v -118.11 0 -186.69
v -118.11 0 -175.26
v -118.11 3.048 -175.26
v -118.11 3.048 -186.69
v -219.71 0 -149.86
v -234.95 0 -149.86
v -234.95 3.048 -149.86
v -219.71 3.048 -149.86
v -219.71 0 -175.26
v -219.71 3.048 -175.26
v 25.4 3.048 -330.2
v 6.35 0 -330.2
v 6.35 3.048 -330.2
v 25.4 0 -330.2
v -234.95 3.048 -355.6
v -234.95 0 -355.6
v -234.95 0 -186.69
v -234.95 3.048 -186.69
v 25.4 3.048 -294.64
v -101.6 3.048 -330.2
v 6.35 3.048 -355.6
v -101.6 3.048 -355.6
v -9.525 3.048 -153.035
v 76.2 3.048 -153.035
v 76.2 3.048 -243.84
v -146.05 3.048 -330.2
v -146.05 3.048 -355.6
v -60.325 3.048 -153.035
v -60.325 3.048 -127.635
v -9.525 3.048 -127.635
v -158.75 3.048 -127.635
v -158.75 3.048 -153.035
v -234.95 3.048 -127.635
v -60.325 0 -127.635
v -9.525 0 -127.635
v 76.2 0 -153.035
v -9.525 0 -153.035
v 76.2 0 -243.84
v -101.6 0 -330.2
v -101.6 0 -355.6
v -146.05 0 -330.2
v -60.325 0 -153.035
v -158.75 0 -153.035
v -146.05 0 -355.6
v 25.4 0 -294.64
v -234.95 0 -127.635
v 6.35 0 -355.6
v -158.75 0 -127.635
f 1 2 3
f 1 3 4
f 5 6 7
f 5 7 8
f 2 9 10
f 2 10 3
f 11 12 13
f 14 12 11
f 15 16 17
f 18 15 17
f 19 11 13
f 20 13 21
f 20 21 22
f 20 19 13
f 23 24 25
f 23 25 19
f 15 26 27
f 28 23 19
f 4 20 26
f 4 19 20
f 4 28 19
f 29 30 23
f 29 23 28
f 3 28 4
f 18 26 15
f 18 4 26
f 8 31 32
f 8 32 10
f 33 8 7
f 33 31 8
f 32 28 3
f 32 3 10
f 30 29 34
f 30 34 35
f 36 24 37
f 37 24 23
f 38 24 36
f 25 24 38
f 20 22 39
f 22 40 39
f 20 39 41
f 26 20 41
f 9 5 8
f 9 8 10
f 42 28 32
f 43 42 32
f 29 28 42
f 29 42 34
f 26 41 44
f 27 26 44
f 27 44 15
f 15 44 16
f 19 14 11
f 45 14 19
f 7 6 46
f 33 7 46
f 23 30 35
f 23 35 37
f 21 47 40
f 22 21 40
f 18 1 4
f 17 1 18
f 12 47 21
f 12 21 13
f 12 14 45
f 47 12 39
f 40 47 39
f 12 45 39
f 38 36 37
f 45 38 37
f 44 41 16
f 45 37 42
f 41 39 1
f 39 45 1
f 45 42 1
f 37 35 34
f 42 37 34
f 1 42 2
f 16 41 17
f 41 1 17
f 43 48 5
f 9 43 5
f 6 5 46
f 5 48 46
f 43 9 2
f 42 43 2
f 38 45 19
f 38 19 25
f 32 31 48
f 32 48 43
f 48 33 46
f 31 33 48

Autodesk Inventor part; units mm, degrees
ref_plane "YZ Plane" through (0, 0, 0) normal (1, 0, 0) x (0, 1, 0)
ref_plane "XZ Plane" through (0, 0, 0) normal (0, 1, 0) x (-1, 0, 0)
ref_plane "XY Plane" through (0, 0, 0) normal (0, 0, 1) x (1, 0, 0)
sketch "Sketch1" plane through (0, 0, 0) normal (0, 1, 0) x (-1, 0, 0)
  line L0 (234.95, 355.6) -> (-234.95, 355.6)
  line L1 (-234.95, 355.6) -> (-234.95, -355.6)
  line L2 (-234.95, -355.6) -> (234.95, -355.6)
  line L3 (234.95, -355.6) -> (234.95, 355.6)
  line L4 (234.95, 355.6) -> (-234.95, -355.6) construction
  line L5 (-234.95, 355.6) -> (234.95, -355.6) construction
  point P0 (0, 0)
  dimension "d0" = 469.9
  dimension "d1" = 711.2
extrude "Plate1" add sketch "Sketch1" along normal blind 3.048
sketch "Sketch3" plane through (0, 3.048, 0) normal (0, 1, 0) x (1, 0, 0)
  line L0 (234.95, -355.6) -> (-234.95, -355.6) projected
  point P0 (0, 0)
sketch "Sketch4" plane through (0, 0, 0) normal (0, -1, 0) x (1, 0, 0)
  line L0 (-234.95, 355.6) -> (234.95, 355.6) projected
  line L1 (-234.95, -355.6) -> (-234.95, 355.6) projected
  line L2 (234.95, -355.6) -> (-234.95, -355.6) projected
  line L3 (234.95, 355.6) -> (234.95, -355.6) projected
  line L4 (-234.95, 355.6) -> (234.95, 355.6) projected
  line L5 (25.4, 355.6) -> (25.4, 294.64)
  line L6 (165.1, 101.6) -> (234.95, 101.6)
  line L7 (234.95, 355.6) -> (234.95, -355.6) projected
  line L8 (25.4, 294.64) -> (165.1, 154.94)
  line L9 (25.4, 294.64) -> (222.9656, 294.64) construction
  line L10 (165.1, 154.94) -> (165.1, 101.6)
  line L11 (234.95, 0) -> (-234.95, 0)
  line L12 (-234.95, -355.6) -> (-234.95, 355.6) projected
  line L13 (25.4, -355.6) -> (25.4, -294.64)
  line L14 (165.1, -127) -> (234.95, -127)
  line L15 (25.4, -294.64) -> (165.1, -154.94)
  line L16 (25.4, -294.64) -> (222.9656, -294.64) construction
  line L17 (165.1, -154.94) -> (165.1, -127)
  line L18 (-234.95, 184.15) -> (-120.65, 184.15)
  line L19 (-120.65, 184.15) -> (-120.65, 177.8)
  line L20 (-120.65, 177.8) -> (-222.25, 177.8)
  line L21 (-222.25, 177.8) -> (-222.25, 152.4)
  line L22 (-222.25, 152.4) -> (-234.95, 152.4)
  line L23 (-234.95, 149.86) -> (-219.71, 149.86)
  line L24 (-219.71, 149.86) -> (-219.71, 175.26)
  line L25 (-219.71, 175.26) -> (-118.11, 175.26)
  line L26 (-118.11, 175.26) -> (-118.11, 186.69)
  line L27 (-118.11, 186.69) -> (-234.95, 186.69)
  line L28 (165.1, -129.54) -> (20.32, -129.54)
  line L29 (20.32, -129.54) -> (20.32, 88.9)
  line L30 (20.32, 88.9) -> (165.1, 88.9)
  line L31 (165.1, 101.6) -> (165.1, 88.9)
  line L32 (-234.95, -184.15) -> (-120.65, -184.15)
  line L33 (-120.65, -184.15) -> (-120.65, -177.8)
  line L34 (-120.65, -177.8) -> (-222.25, -177.8)
  line L35 (-222.25, -177.8) -> (-222.25, -152.4)
  line L36 (-222.25, -152.4) -> (-234.95, -152.4)
  line L37 (-234.95, -149.86) -> (-219.71, -149.86)
  line L38 (-219.71, -149.86) -> (-219.71, -175.26)
  line L39 (-219.71, -175.26) -> (-118.11, -175.26)
  line L40 (-118.11, -175.26) -> (-118.11, -186.69)
  line L41 (-118.11, -186.69) -> (-234.95, -186.69)
  line L42 (-158.75, 35.56) -> (-158.75, -43.18)
  line L43 (-158.75, -43.18) -> (-234.95, -43.18)
  line L44 (-158.75, 35.56) -> (-234.95, 35.56)
  line L45 (25.4, 330.2) -> (6.35, 330.2)
  line L46 (6.35, 330.2) -> (6.35, 355.6)
  line L47 (25.4, -330.2) -> (6.35, -330.2)
  line L48 (6.35, -330.2) -> (6.35, -355.6)
  line L49 (234.95, -355.6) -> (-234.95, -355.6) projected
  point P0 (0, 0)
  dimension "d3" = 209.55
  dimension "d4" = 254
  dimension "d5" = 45
  dimension "d6" = 60.96
  dimension "d9" = 69.85
  dimension "d12" = 45
  dimension "d13" = 209.55
  dimension "d14" = 228.6
  dimension "d15" = 69.85
  dimension "d16" = 60.96
  dimension "d17" = 171.45
  dimension "d18" = 114.3
  dimension "d19" = 6.35
  dimension "d21" = 101.6
  dimension "d22" = 25.4
  dimension "d23" = 2.54
  dimension "d26" = 144.78
  dimension "d31" = 12.7
  dimension "d32" = 114.3
  dimension "d33" = 171.45
  dimension "d34" = 6.35
  dimension "d35" = 101.6
  dimension "d36" = 25.4
  dimension "d37" = 2.54
  dimension "d38" = 76.2
  dimension "d39" = 35.56
  dimension "d40" = 43.18
  dimension "d41" = 2.54
  dimension "d42" = 25.4
  dimension "d43" = 19.05
  dimension "d44" = 25.4
  dimension "d45" = 19.05
extrude "Cut1" cut sketch "Sketch4" against normal blind 3.048 contours L27 L26 L25 L24 L23 L1 L22 L21 L20 L19 L18 | L0 L3 L6 L10 L8 L5 | L18 L19 L20 L21 L22 L1 | L3 L11 L29 L30 L31 L6 | L3 L14 L17 L28 L29 L11 | L44 L42 L11 L1 | L3 L2 L13 L15 L17 L14 | L11 L42 L43 L1 | L37 L38 L39 L40 L41 L1 L32 L33 L34 L35 L36 | L36 L35 L34 L33 L32 L1
sketch "Sketch5" plane through (0, 0, 0) normal (0, -1, 0) x (1, 0, 0)
  line L0 (25.4, 355.6) -> (25.4, 294.64) projected
  line L1 (25.4, 294.64) -> (165.1, 154.94) projected
  line L2 (165.1, 154.94) -> (165.1, 88.9) projected
  line L3 (165.1, 88.9) -> (20.32, 88.9) projected
  line L4 (20.32, 88.9) -> (20.32, -129.54) projected
  line L5 (20.32, -129.54) -> (165.1, -129.54) projected
  line L6 (165.1, -129.54) -> (165.1, -154.94) projected
  line L7 (165.1, -154.94) -> (25.4, -294.64) projected
  line L8 (25.4, -294.64) -> (25.4, -355.6) projected
  line L9 (25.4, -355.6) -> (-234.95, -355.6) projected
  line L10 (-234.95, -355.6) -> (-234.95, -186.69) projected
  line L11 (-234.95, -186.69) -> (-118.11, -186.69) projected
  line L12 (-118.11, -186.69) -> (-118.11, -175.26) projected
  line L13 (-118.11, -175.26) -> (-219.71, -175.26) projected
  line L14 (-219.71, -175.26) -> (-219.71, -149.86) projected
  line L15 (-219.71, -149.86) -> (-234.95, -149.86) projected
  line L16 (-234.95, -149.86) -> (-234.95, -43.18) projected
  line L17 (-234.95, -43.18) -> (-158.75, -43.18) projected
  line L18 (-158.75, -43.18) -> (-158.75, 35.56) projected
  line L19 (-158.75, 35.56) -> (-234.95, 35.56) projected
  line L20 (-234.95, 35.56) -> (-234.95, 149.86) projected
  line L21 (-234.95, 149.86) -> (-219.71, 149.86) projected
  line L22 (-219.71, 149.86) -> (-219.71, 175.26) projected
  line L23 (-219.71, 175.26) -> (-118.11, 175.26) projected
  line L24 (-118.11, 175.26) -> (-118.11, 186.69) projected
  line L25 (-118.11, 186.69) -> (-234.95, 186.69) projected
  line L26 (-234.95, 186.69) -> (-234.95, 355.6) projected
  line L27 (-234.95, 355.6) -> (25.4, 355.6) projected
  line L28 (25.4, -355.6) -> (-234.95, -355.6) projected
  line L29 (25.4, -355.6) -> (6.35, -355.6)
  line L30 (6.35, -355.6) -> (6.35, -330.2)
  line L31 (6.35, -330.2) -> (25.4, -330.2)
  line L32 (25.4, -330.2) -> (25.4, -355.6)
  line L33 (-234.95, 355.6) -> (25.4, 355.6) projected
  line L34 (25.4, 355.6) -> (6.35, 355.6)
  line L35 (6.35, 355.6) -> (6.35, 330.2)
  line L36 (6.35, 330.2) -> (25.4, 330.2)
  line L37 (25.4, 330.2) -> (25.4, 355.6)
  line L38 (-146.05, -355.6) -> (-101.6, -355.6)
  line L39 (-101.6, -355.6) -> (-101.6, -330.2)
  line L40 (-101.6, -330.2) -> (-146.05, -330.2)
  line L41 (-146.05, -330.2) -> (-146.05, -355.6)
  line L42 (-146.05, 355.6) -> (-101.6, 355.6)
  line L43 (-101.6, 355.6) -> (-101.6, 330.2)
  line L44 (-101.6, 330.2) -> (-146.05, 330.2)
  line L45 (-146.05, 330.2) -> (-146.05, 355.6)
  point P0 (0, 0)
  dimension "d46" = 19.05
  dimension "d47" = 25.4
  dimension "d48" = 19.05
  dimension "d49" = 25.4
  dimension "d52" = 44.45
  dimension "d53" = 25.4
  dimension "d54" = 88.9
  dimension "d55" = 44.45
  dimension "d56" = 25.4
  dimension "d57" = 88.9
extrude "Cut2" cut sketch "Sketch5" against normal blind 3.048 contours L0 L36 L35 L27 | L43 L44 L45 L27 | L8 L9 L30 L31 | L9 L41 L40 L39
sketch "Sketch6" plane through (0, 3.048, 0) normal (0, 1, 0) x (1, 0, 0)
  line L0 (20.32, -88.9) -> (165.1, -88.9) projected
  line L1 (165.1, -88.9) -> (165.1, -154.94) projected
  line L2 (165.1, -154.94) -> (25.4, -294.64) projected
  line L3 (25.4, -294.64) -> (25.4, -330.2) projected
  line L4 (25.4, -330.2) -> (6.35, -330.2) projected
  line L5 (6.35, -330.2) -> (6.35, -355.6) projected
  line L6 (6.35, -355.6) -> (-101.6, -355.6) projected
  line L7 (-101.6, -355.6) -> (-101.6, -330.2) projected
  line L8 (-101.6, -330.2) -> (-146.05, -330.2) projected
  line L9 (-146.05, -330.2) -> (-146.05, -355.6) projected
  line L10 (-146.05, -355.6) -> (-234.95, -355.6) projected
  line L11 (-234.95, -355.6) -> (-234.95, -186.69) projected
  line L12 (-234.95, -186.69) -> (-118.11, -186.69) projected
  line L13 (-118.11, -186.69) -> (-118.11, -175.26) projected
  line L14 (-118.11, -175.26) -> (-219.71, -175.26) projected
  line L15 (-219.71, -175.26) -> (-219.71, -149.86) projected
  line L16 (-219.71, -149.86) -> (-234.95, -149.86) projected
  line L17 (-234.95, -149.86) -> (-234.95, -35.56) projected
  line L18 (-234.95, -35.56) -> (-158.75, -35.56) projected
  line L19 (-158.75, -35.56) -> (-158.75, 43.18) projected
  line L20 (-158.75, 43.18) -> (-234.95, 43.18) projected
  line L21 (-234.95, 43.18) -> (-234.95, 149.86) projected
  line L22 (-234.95, 149.86) -> (-219.71, 149.86) projected
  line L23 (-219.71, 149.86) -> (-219.71, 175.26) projected
  line L24 (-219.71, 175.26) -> (-118.11, 175.26) projected
  line L25 (-118.11, 175.26) -> (-118.11, 186.69) projected
  line L26 (-118.11, 186.69) -> (-234.95, 186.69) projected
  line L27 (-234.95, 186.69) -> (-234.95, 355.6) projected
  line L28 (-234.95, 355.6) -> (-146.05, 355.6) projected
  line L29 (-146.05, 355.6) -> (-146.05, 330.2) projected
  line L30 (-146.05, 330.2) -> (-101.6, 330.2) projected
  line L31 (-101.6, 330.2) -> (-101.6, 355.6) projected
  line L32 (-101.6, 355.6) -> (6.35, 355.6) projected
  line L33 (6.35, 355.6) -> (6.35, 330.2) projected
  line L34 (6.35, 330.2) -> (25.4, 330.2) projected
  line L35 (25.4, 330.2) -> (25.4, 294.64) projected
  line L36 (25.4, 294.64) -> (165.1, 154.94) projected
  line L37 (165.1, 154.94) -> (165.1, 129.54) projected
  line L38 (165.1, 129.54) -> (20.32, 129.54) projected
  line L39 (20.32, 129.54) -> (20.32, -88.9) projected
  line L40 (-234.95, -151.765) -> (-158.75, -151.765)
  line L41 (-158.75, -151.765) -> (-158.75, -126.365)
  line L42 (-158.75, -126.365) -> (-234.95, -126.365)
  line L43 (-234.95, -126.365) -> (-234.95, -151.765)
  line L44 (-234.95, -151.765) -> (-158.75, -126.365) construction
  line L45 (-158.75, -151.765) -> (-234.95, -126.365) construction
  line L46 (88.9, -151.765) -> (165.1, -151.765)
  line L47 (165.1, -151.765) -> (165.1, -126.365)
  line L48 (165.1, -126.365) -> (88.9, -126.365)
  line L49 (88.9, -126.365) -> (88.9, -151.765)
  line L50 (88.9, -151.765) -> (165.1, -126.365) construction
  line L51 (165.1, -151.765) -> (88.9, -126.365) construction
  line L52 (165.1, -154.94) -> (165.1, -88.9) projected
  line L53 (-234.95, -149.86) -> (-234.95, -35.56) projected
  line L54 (88.9, 127.635) -> (165.1, 127.635)
  line L55 (165.1, 127.635) -> (165.1, 153.035)
  line L56 (165.1, 153.035) -> (88.9, 153.035)
  line L57 (88.9, 153.035) -> (88.9, 127.635)
  line L58 (88.9, 127.635) -> (165.1, 153.035) construction
  line L59 (165.1, 127.635) -> (88.9, 153.035) construction
  line L60 (-60.325, 127.635) -> (-9.525, 127.635)
  line L61 (-9.525, 127.635) -> (-9.525, 153.035)
  line L62 (-9.525, 153.035) -> (-60.325, 153.035)
  line L63 (-60.325, 153.035) -> (-60.325, 127.635)
  line L64 (-60.325, 127.635) -> (-9.525, 153.035) construction
  line L65 (-9.525, 127.635) -> (-60.325, 153.035) construction
  line L66 (-60.325, -151.765) -> (-9.525, -151.765)
  line L67 (-9.525, -151.765) -> (-9.525, -126.365)
  line L68 (-9.525, -126.365) -> (-60.325, -126.365)
  line L69 (-60.325, -126.365) -> (-60.325, -151.765)
  line L70 (-60.325, -151.765) -> (-9.525, -126.365) construction
  line L71 (-9.525, -151.765) -> (-60.325, -126.365) construction
  line L72 (-196.85, -139.065) -> (127, -139.065) construction
  line L73 (-234.95, 127.635) -> (-158.75, 127.635)
  line L74 (-158.75, 127.635) -> (-158.75, 153.035)
  line L75 (-158.75, 153.035) -> (-234.95, 153.035)
  line L76 (-234.95, 153.035) -> (-234.95, 127.635)
  line L77 (-234.95, 127.635) -> (-158.75, 153.035) construction
  line L78 (-158.75, 127.635) -> (-234.95, 153.035) construction
  line L79 (-158.75, -151.765) -> (88.9, -151.765)
  line L80 (88.9, 153.035) -> (-158.75, 153.035)
  line L81 (-158.75, -126.365) -> (88.9, -126.365)
  line L82 (-158.75, 127.635) -> (88.9, 127.635)
  line L83 (165.1, 129.54) -> (20.32, 129.54) construction
  line L84 (-6.35, -151.765) -> (-6.35, -126.365)
  line L85 (85.725, -151.765) -> (85.725, -126.365)
  line L86 (-155.575, -151.765) -> (-155.575, -126.365)
  line L87 (-63.5, -151.765) -> (-63.5, -126.365)
  line L88 (-63.5, 127.635) -> (-63.5, 153.035)
  line L89 (-6.35, 127.635) -> (-6.35, 153.035)
  line L90 (85.725, 127.635) -> (85.725, 153.035)
  line L91 (-155.575, 127.635) -> (-155.575, 153.035)
  line L92 (-234.95, -35.56) -> (-234.95, -149.86) construction
  line L93 (-234.95, -127.9525) -> (165.1, -127.9525)
  line L94 (165.1, -88.9) -> (165.1, -154.94) construction
  point P0 (0, 0)
  point P1 (127, 140.335)
  point P2 (-34.925, 140.335)
  point P3 (-34.925, -139.065)
  point P4 (-34.925, -139.065)
  point P5 (-196.85, 140.335)
  point P6 (-9.525, -151.765)
  point P7 (-219.71, -151.765)
  point P8 (-60.325, -126.365)
  point P9 (-60.325, -126.365)
  point P10 (-158.75, -127.9525)
  point P11 (-60.325, -127.9525)
  point P12 (-9.525, -127.9525)
  dimension "d58" = 25.4
  dimension "d59" = 3.175
  dimension "d60" = 76.2
  dimension "d61" = 50.8
  dimension "d62" = 279.4
  dimension "d65" = 3.175
  dimension "d66" = 3.175
  dimension "d67" = 3.175
  dimension "d68" = 3.175
  dimension "d69" = 3.175
  dimension "d70" = 3.175
  dimension "d71" = 3.175
  dimension "d72" = 3.175
  dimension "d73" = 1.5875
extrude "Extrusion1" cut sketch "Sketch6" against normal through all contours L0 L1 L48 L81 L68 L42 L17 L18 L19 L20 L21 L73 L82 L60 L39 | L82 L89 L80 L90 L38 L39 | L1 L93 L49 L48 | L82 L61 L80 L89 | L1 L46 L49 L93 | L49 L93 L85 L81 | L90 L80 L57 L38 | L1 L2 L3 L4 L5 L6 L7 L8 L9 L10 L11 L12 L13 L14 L15 L40 L79 L66 L46 | L49 L79 L85 L93 | L85 L93 L84 L81 | L57 L56 L37 L38 | L82 L88 L80 L63 | L85 L79 L84 L93 | L84 L93 L67 L81 | L82 L91 L80 L88 | L84 L79 L67 L93 | L67 L93 L69 L68 | L82 L74 L80 L91 | L67 L66 L69 L93 | L69 L93 L87 L81 | L69 L79 L87 L93 | L87 L93 L86 L81 | L87 L79 L86 L93 | L86 L93 L41 L81 | L86 L79 L41 L93 | L41 L93 L17 L42 | L41 L40 L15 L16 L17 L93
sketch "Sketch7" plane through (0, 3.048, 0) normal (0, 1, 0) x (1, 0, 0)
  line L0 (-9.525, 153.035) -> (165.1, 153.035) projected
  line L1 (76.2, 153.035) -> (76.2, 243.84)
  line L2 (-118.11, 186.69) -> (-234.95, 186.69) projected
  line L3 (-234.95, 186.69) -> (-234.95, 355.6) projected
  line L4 (-234.95, 355.6) -> (-146.05, 355.6) projected
  line L5 (-146.05, 355.6) -> (-146.05, 330.2) projected
  line L6 (-146.05, 330.2) -> (-101.6, 330.2) projected
  line L7 (-101.6, 330.2) -> (-101.6, 355.6) projected
  line L8 (-101.6, 355.6) -> (6.35, 355.6) projected
  line L9 (6.35, 355.6) -> (6.35, 330.2) projected
  line L10 (6.35, 330.2) -> (25.4, 330.2) projected
  line L11 (25.4, 330.2) -> (25.4, 294.64) projected
  line L12 (25.4, 294.64) -> (165.1, 154.94) projected
  line L13 (165.1, 154.94) -> (165.1, 153.035) projected
  line L14 (165.1, 153.035) -> (-9.525, 153.035) projected
  line L15 (-9.525, 153.035) -> (-9.525, 127.635) projected
  line L16 (-9.525, 127.635) -> (-60.325, 127.635) projected
  line L17 (-60.325, 127.635) -> (-60.325, 153.035) projected
  line L18 (-60.325, 153.035) -> (-158.75, 153.035) projected
  line L19 (-158.75, 153.035) -> (-158.75, 127.635) projected
  line L20 (-158.75, 127.635) -> (-234.95, 127.635) projected
  line L21 (-234.95, 127.635) -> (-234.95, 149.86) projected
  line L22 (-234.95, 149.86) -> (-219.71, 149.86) projected
  line L23 (-219.71, 149.86) -> (-219.71, 175.26) projected
  line L24 (-219.71, 175.26) -> (-118.11, 175.26) projected
  line L25 (-118.11, 175.26) -> (-118.11, 186.69) projected
  point P0 (0, 0)
  dimension "d74" = 88.9
extrude "Extrusion2" cut sketch "Sketch7" against normal through all contours L1 L12 L13 L0
equation "\"d10\" = Thickness"
equation "\"d2\" = Thickness"
equation "\"BendRadius\" = Thickness"
equation "\"BendReliefWidth\" = Thickness"
equation "\"BendReliefDepth\" = 0.5 * Thickness"
equation "\"CornerReliefSize\" = 4 * Thickness"
equation "\"MinimumRemnant\" = 2 * Thickness"
equation "\"TransitionRadius\" = BendRadius"
equation "\"JacobiRadiusSize\" = BendRadius"
equation "\"GapSize\" = Thickness"
equation "\"Thickness\" = 3.048"
properties part number "DB1-022" material "Polycarbonate, Smoke"
